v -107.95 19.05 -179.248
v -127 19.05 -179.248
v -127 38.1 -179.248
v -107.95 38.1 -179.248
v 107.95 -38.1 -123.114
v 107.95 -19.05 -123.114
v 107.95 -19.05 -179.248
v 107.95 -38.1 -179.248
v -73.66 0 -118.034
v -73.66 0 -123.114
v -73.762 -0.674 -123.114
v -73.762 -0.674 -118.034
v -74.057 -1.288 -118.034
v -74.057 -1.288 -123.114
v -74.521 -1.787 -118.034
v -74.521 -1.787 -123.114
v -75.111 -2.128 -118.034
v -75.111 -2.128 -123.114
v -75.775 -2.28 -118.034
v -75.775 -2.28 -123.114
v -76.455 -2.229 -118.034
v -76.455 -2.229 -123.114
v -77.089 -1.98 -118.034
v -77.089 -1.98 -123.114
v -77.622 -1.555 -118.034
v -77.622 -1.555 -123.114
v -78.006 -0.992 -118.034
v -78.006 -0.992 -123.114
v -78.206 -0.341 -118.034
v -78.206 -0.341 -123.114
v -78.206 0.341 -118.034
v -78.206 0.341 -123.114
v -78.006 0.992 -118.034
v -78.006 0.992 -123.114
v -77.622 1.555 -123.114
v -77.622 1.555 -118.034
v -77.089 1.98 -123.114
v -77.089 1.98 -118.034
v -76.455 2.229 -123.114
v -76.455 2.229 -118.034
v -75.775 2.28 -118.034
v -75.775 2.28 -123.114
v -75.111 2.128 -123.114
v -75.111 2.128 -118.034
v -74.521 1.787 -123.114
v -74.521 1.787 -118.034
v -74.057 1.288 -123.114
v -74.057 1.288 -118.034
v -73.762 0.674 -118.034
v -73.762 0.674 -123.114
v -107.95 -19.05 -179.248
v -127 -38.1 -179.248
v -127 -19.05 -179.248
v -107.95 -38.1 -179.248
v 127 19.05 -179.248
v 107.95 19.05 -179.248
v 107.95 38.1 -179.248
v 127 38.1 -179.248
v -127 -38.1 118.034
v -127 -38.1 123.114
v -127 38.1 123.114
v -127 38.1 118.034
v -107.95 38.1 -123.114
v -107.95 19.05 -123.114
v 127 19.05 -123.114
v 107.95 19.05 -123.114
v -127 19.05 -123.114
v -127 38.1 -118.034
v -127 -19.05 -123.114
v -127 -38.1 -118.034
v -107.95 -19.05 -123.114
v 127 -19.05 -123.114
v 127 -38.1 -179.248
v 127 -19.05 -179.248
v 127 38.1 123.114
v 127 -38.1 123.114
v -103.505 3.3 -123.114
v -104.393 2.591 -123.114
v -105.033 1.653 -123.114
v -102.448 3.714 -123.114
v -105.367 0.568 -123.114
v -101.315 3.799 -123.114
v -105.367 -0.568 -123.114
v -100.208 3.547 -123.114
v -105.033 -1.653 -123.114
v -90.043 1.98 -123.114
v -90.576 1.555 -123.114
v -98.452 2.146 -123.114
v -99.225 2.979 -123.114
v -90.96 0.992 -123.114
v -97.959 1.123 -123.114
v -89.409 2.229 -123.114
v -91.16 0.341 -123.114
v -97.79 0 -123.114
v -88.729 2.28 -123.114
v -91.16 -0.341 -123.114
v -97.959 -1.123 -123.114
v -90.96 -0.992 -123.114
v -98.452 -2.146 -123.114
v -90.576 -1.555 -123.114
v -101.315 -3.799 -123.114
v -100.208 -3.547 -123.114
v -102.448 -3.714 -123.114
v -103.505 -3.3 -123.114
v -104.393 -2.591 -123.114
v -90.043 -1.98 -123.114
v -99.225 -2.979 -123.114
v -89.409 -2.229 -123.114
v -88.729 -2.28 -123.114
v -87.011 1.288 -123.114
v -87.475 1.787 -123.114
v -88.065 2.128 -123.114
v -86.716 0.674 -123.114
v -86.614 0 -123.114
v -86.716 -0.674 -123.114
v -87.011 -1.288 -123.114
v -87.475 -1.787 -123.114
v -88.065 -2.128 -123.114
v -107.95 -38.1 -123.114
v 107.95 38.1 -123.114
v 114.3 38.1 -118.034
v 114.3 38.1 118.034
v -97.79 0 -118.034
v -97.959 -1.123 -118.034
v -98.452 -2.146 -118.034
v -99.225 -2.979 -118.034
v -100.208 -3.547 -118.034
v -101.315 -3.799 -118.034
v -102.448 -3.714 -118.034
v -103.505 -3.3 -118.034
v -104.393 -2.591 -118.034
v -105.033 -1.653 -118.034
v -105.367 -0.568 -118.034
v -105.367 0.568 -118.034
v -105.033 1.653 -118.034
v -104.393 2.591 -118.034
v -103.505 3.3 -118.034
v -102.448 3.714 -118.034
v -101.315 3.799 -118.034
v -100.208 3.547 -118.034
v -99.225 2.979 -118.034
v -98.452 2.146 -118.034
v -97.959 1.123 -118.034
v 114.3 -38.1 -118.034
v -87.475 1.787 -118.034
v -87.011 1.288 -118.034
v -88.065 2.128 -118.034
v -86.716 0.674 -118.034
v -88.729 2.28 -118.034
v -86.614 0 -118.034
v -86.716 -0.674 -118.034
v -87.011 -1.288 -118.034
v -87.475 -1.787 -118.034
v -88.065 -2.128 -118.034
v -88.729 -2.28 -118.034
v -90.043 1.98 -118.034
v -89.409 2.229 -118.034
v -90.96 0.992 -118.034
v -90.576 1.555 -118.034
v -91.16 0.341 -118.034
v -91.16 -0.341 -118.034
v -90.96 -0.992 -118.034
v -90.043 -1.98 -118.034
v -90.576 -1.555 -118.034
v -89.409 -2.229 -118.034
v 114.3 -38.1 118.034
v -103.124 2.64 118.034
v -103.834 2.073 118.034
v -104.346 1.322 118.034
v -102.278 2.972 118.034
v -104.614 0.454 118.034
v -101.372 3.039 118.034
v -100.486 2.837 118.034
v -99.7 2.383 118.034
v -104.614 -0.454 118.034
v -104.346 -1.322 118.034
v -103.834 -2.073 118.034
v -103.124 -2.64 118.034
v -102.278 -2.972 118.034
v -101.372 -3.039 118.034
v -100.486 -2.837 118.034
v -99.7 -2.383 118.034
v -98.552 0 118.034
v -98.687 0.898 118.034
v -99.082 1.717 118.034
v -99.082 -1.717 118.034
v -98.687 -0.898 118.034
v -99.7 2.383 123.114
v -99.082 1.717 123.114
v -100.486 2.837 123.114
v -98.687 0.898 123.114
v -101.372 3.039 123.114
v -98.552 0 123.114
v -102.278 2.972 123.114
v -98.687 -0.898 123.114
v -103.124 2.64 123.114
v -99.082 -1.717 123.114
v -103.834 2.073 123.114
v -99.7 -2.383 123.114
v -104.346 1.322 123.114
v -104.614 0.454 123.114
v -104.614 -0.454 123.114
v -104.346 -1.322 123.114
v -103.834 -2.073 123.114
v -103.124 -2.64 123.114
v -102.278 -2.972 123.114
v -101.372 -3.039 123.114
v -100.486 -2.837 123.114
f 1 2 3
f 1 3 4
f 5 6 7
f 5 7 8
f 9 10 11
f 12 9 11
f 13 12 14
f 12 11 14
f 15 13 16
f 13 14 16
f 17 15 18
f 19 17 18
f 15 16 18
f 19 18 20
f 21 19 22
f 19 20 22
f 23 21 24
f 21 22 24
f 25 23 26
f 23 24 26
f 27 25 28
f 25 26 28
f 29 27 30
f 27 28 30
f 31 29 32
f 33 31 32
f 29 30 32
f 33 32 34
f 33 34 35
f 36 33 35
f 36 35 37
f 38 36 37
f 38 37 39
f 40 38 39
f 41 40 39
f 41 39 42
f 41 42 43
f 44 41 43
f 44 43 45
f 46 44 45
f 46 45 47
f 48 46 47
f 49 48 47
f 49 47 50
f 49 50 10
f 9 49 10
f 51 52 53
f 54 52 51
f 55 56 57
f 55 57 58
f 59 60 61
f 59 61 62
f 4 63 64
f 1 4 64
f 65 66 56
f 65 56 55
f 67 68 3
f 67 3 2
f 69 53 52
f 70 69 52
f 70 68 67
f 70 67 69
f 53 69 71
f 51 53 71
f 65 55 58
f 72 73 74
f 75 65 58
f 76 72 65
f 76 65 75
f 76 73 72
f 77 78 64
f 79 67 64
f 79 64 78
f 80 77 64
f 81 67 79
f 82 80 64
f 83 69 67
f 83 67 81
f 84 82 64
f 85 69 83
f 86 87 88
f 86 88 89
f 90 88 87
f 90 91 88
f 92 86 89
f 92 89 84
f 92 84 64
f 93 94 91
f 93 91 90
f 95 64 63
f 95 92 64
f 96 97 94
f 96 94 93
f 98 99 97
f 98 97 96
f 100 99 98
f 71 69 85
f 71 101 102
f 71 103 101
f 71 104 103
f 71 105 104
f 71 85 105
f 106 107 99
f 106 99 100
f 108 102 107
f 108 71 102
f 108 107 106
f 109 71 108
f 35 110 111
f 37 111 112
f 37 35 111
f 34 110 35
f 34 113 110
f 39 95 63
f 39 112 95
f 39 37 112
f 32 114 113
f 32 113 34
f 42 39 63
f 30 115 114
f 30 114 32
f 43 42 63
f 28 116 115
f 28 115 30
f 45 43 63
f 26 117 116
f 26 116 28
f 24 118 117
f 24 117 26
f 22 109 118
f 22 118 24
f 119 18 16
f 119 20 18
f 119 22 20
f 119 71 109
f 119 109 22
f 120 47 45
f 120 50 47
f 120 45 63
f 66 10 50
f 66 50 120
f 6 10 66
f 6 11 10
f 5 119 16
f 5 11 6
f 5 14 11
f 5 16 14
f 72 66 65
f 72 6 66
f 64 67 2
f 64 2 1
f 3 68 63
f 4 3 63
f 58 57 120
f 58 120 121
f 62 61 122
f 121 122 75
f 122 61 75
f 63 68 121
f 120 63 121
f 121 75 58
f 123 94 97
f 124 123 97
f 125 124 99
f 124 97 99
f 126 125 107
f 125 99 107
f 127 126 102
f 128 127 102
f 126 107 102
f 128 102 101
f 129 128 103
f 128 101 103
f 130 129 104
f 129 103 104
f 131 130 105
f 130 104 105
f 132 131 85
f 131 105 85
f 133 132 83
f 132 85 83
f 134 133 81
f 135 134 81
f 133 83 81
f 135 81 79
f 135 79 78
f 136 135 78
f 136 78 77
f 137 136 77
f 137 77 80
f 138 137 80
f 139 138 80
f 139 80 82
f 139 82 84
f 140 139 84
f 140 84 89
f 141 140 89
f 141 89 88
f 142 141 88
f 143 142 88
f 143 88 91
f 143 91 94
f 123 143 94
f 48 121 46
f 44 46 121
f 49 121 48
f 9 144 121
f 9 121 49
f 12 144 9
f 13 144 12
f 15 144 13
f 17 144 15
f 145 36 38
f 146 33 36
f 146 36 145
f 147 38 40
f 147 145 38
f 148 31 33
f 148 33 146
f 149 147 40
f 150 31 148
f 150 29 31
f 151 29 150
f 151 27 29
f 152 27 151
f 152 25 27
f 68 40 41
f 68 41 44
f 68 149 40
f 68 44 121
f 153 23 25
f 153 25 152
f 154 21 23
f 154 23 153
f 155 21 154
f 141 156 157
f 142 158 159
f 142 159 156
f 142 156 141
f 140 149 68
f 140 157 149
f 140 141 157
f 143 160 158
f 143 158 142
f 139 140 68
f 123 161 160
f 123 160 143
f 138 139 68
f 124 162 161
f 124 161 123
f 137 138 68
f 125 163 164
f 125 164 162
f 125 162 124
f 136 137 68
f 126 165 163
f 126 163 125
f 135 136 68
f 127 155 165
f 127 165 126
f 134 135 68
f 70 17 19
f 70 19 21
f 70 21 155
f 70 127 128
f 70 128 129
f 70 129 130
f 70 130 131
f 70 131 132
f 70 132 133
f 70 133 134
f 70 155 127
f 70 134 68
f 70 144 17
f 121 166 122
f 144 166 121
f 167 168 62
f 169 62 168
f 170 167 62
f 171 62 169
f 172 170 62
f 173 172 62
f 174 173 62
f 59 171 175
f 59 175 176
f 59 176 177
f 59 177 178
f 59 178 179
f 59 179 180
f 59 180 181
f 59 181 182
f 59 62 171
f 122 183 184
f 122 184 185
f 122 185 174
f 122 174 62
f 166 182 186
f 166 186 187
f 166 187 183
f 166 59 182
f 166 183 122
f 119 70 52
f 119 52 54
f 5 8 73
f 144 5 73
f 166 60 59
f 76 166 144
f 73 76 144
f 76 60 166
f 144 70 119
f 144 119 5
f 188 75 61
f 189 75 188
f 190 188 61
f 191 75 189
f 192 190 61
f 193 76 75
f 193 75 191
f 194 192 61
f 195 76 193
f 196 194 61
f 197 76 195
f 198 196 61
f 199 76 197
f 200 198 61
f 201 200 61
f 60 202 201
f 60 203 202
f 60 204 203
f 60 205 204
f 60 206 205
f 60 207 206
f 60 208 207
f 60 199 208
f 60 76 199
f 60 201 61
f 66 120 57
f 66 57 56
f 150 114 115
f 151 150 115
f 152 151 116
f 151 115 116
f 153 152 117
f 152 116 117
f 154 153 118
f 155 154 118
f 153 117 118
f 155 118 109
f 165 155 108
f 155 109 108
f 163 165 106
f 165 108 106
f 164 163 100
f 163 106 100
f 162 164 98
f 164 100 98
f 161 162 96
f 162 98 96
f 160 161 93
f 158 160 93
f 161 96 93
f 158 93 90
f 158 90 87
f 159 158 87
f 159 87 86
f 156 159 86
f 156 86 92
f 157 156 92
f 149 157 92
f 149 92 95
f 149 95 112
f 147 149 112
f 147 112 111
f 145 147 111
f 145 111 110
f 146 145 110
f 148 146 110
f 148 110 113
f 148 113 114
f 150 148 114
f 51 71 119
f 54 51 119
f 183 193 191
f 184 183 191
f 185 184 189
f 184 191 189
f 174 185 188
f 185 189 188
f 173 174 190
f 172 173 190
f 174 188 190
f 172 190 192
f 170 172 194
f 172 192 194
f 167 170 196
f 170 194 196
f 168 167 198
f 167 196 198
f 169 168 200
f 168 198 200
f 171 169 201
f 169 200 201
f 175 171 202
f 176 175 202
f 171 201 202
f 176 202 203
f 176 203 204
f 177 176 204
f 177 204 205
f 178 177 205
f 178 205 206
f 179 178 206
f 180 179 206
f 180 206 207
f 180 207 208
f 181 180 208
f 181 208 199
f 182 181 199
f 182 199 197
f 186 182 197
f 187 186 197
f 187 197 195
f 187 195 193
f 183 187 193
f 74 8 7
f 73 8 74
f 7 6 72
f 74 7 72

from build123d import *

# Parameters (mm, degrees)
F1_DEPTH = 38.1
F2_R     = 3.048
F3_DEPTH = 246.2286
F4_W     = 19.05
F4_H     = 19.05
F5_DEPTH = 56.134
F6_R     = 2.286
F6_R_2   = 3.81
F6_R_3   = 3.048
F7_DEPTH = 25.4


with BuildPart() as f1:
    # F0 (on Front) → F1 (new body, symmetric)
    with BuildSketch(Plane.XZ):
        Polygon((127, 123.1138), (-127, 123.1138), (-127, 118.0338), (-114.3, 118.0338), (114.3, 118.0338), (114.3, -118.0338), (-114.3, -118.0338), (-127, -118.0338), (-127, -123.1138), (127, -123.1138), align=None)
    extrude(amount=F1_DEPTH, both=True)

    # F2 (on face) → F3 (cut, through all)
    with BuildSketch(Plane.XY.offset(123.1138)):
        with Locations((-101.6, 0)):
            Circle(F2_R)
    extrude(amount=-F3_DEPTH, mode=Mode.SUBTRACT)

    # F4 (on face) → F5 (join)
    with BuildSketch(Plane(origin=(0, 0, -123.1138), x_dir=(1, 0, 0), z_dir=(0, 0, -1))):
        with Locations((-117.475, 28.575)):
            Rectangle(F4_W, F4_H)
        with Locations((-117.475, -28.575)):
            Rectangle(F4_W, F4_H)
        with Locations((117.475, 28.575)):
            Rectangle(F4_W, F4_H)
        with Locations((117.475, -28.575)):
            Rectangle(F4_W, F4_H)
    extrude(amount=F5_DEPTH)

    # F6 (on face) → F7 (cut)
    with BuildSketch(Plane(origin=(0, 0, -123.1138), x_dir=(1, 0, 0), z_dir=(0, 0, -1))):
        with Locations((-88.9, 0)):
            Circle(F6_R)
        with Locations((-75.946, 0)):
            Circle(F6_R)
        with Locations((-101.6, 0)):
            Circle(F6_R_2)
        with Locations((-101.6, 0)):
            Circle(F6_R_3, mode=Mode.SUBTRACT)
    extrude(amount=-F7_DEPTH, mode=Mode.SUBTRACT)


solid = f1.part
